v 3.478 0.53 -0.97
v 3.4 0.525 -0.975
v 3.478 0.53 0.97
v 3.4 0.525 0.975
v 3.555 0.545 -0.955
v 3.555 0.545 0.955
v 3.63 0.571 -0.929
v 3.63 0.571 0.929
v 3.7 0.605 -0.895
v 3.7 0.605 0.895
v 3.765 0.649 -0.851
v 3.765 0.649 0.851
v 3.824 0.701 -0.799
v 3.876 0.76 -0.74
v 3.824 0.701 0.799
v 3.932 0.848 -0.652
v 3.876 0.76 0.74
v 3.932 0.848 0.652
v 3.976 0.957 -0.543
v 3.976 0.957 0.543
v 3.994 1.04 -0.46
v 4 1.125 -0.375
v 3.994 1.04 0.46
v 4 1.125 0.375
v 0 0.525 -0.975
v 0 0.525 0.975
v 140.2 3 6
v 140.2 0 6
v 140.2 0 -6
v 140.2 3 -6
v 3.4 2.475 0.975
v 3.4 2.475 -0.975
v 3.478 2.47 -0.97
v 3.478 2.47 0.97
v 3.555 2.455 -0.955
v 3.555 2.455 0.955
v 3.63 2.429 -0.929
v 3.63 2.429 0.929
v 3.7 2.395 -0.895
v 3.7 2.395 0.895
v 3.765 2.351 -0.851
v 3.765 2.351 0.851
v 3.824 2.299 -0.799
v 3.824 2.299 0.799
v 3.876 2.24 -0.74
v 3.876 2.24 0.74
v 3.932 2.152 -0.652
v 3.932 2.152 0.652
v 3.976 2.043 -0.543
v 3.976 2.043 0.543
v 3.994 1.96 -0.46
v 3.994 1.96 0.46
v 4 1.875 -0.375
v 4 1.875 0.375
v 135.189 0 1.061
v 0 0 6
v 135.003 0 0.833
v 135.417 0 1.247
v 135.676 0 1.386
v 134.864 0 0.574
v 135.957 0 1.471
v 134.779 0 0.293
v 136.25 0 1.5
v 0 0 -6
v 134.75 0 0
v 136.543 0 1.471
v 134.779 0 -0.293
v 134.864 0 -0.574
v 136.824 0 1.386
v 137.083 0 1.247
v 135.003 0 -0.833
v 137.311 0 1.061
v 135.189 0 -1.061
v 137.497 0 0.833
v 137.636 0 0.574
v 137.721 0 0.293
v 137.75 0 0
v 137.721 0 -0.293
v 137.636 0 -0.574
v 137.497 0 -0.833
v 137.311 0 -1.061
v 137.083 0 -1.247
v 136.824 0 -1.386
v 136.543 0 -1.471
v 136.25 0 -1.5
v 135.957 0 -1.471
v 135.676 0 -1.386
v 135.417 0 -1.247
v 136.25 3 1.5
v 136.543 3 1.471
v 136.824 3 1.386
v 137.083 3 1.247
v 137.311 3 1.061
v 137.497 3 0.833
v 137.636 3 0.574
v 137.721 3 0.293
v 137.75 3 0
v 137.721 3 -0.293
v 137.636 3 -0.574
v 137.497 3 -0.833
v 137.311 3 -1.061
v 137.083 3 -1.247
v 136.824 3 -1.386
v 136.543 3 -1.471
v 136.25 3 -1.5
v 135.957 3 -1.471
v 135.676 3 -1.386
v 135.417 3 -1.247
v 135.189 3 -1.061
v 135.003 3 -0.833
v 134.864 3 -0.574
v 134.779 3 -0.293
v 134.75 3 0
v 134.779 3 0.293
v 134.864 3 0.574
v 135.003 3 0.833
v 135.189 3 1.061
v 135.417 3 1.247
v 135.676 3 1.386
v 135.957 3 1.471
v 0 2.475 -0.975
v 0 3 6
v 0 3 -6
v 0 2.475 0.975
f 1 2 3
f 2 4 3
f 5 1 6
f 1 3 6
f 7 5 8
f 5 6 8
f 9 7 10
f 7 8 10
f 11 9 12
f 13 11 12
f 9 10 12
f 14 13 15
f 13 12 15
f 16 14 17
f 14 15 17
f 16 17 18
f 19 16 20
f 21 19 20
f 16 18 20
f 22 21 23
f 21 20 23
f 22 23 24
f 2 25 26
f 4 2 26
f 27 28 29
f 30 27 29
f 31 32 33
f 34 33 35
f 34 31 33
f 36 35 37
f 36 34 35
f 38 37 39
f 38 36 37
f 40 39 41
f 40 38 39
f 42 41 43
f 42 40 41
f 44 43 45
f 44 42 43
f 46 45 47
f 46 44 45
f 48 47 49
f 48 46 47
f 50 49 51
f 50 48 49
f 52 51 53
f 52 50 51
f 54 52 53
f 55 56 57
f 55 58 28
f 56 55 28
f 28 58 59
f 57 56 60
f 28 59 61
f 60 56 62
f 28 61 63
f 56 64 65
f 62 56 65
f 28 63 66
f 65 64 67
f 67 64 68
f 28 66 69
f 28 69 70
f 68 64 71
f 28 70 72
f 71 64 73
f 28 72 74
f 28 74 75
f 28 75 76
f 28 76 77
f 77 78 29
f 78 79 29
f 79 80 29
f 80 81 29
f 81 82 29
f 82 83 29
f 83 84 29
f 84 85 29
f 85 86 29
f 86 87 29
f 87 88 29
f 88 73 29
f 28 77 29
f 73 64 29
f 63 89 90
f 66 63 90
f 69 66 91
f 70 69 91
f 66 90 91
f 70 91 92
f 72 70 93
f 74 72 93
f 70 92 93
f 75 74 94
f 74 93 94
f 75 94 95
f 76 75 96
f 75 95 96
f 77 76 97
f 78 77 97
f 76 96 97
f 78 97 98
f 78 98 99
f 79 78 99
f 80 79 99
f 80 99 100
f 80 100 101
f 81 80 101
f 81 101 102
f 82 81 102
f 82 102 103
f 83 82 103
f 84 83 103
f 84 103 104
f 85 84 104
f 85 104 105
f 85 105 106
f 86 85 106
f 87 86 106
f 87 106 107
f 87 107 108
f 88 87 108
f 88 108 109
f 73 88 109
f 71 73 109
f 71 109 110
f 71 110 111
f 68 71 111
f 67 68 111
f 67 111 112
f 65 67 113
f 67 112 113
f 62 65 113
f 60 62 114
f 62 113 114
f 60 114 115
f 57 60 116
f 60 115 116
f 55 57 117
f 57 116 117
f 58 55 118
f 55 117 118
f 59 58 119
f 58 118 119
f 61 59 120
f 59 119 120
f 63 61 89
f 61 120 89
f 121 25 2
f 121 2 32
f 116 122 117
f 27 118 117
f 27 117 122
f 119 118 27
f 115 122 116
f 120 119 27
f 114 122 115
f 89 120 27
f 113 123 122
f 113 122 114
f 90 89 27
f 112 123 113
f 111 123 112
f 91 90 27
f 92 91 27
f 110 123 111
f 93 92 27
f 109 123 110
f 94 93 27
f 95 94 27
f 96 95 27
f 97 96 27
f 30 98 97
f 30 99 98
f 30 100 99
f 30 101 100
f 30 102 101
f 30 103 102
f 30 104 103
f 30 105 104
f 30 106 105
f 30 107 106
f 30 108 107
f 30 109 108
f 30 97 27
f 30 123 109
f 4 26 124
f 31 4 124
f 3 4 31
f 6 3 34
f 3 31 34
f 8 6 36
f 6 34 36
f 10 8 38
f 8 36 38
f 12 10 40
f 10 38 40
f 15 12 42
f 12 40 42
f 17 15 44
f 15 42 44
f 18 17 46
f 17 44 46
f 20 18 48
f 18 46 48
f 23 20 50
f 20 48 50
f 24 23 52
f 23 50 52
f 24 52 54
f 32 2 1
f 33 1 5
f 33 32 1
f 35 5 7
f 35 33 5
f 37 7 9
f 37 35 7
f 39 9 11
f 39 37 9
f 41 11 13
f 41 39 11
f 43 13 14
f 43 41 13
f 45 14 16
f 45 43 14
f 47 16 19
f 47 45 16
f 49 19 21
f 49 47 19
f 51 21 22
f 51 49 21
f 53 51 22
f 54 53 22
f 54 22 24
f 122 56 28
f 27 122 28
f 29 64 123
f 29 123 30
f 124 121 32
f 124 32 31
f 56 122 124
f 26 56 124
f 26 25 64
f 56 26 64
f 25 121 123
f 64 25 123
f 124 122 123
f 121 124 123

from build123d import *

# Parameters (mm, degrees)
SKETCH1_W           = 280.4
SKETCH1_H           = 12
BOSS_EXTRUDE1_DEPTH = 3
SKETCH3_R           = 1.5
CUT_EXTRUDE1_DEPTH  = 141.360393274
SKETCH6_W           = 140.2
SKETCH6_H           = 12
CUT_EXTRUDE2_DEPTH  = 141.360393274
SKETCH7_W           = 1.95
SKETCH7_H           = 1.95
CUT_EXTRUDE3_DEPTH  = 4
FILLET1_R           = 0.6


with BuildPart() as part:
    # Sketch1 → Boss-Extrude1 (new body)
    with BuildSketch(Plane(origin=(0, 0, 0), x_dir=(1, 0, 0), z_dir=(0, 1, 0))):
        Rectangle(SKETCH1_W, SKETCH1_H)
    extrude(amount=BOSS_EXTRUDE1_DEPTH)

    # Sketch3 → Cut-Extrude1 (cut, through all)
    with BuildSketch(Plane(origin=(0, 3, 0), x_dir=(1, 0, 0), z_dir=(0, 1, 0))):
        with Locations(Location((-136.25, 0, 0), (0, 0, 270))):
            Circle(SKETCH3_R)
        with Locations(Location((136.25, 0, 0), (0, 0, 270))):
            Circle(SKETCH3_R)
    extrude(amount=-CUT_EXTRUDE1_DEPTH, mode=Mode.SUBTRACT)

    # Sketch6 → Cut-Extrude2 (cut, through all)
    with BuildSketch(Plane(origin=(0, 3, 0), x_dir=(1, 0, 0), z_dir=(0, 1, 0))):
        with Locations((-70.1, 0)):
            Rectangle(SKETCH6_W, SKETCH6_H)
    extrude(amount=-CUT_EXTRUDE2_DEPTH, mode=Mode.SUBTRACT)

    # Sketch7 → Cut-Extrude3 (cut)
    with BuildSketch(Plane.ZY):
        with Locations((0, 1.5)):
            Rectangle(SKETCH7_W, SKETCH7_H)
    extrude(amount=-CUT_EXTRUDE3_DEPTH, mode=Mode.SUBTRACT)

    # Fillet1
    fillet1_edges = [part.edges().sort_by_distance(p)[0] for p in [
        (4, 1.5, 0.975),
        (4, 0.525, 0),
        (4, 1.5, -0.975),
        (4, 2.475, 0),
    ]]
    fillet(fillet1_edges, radius=FILLET1_R)


solid = part.part
